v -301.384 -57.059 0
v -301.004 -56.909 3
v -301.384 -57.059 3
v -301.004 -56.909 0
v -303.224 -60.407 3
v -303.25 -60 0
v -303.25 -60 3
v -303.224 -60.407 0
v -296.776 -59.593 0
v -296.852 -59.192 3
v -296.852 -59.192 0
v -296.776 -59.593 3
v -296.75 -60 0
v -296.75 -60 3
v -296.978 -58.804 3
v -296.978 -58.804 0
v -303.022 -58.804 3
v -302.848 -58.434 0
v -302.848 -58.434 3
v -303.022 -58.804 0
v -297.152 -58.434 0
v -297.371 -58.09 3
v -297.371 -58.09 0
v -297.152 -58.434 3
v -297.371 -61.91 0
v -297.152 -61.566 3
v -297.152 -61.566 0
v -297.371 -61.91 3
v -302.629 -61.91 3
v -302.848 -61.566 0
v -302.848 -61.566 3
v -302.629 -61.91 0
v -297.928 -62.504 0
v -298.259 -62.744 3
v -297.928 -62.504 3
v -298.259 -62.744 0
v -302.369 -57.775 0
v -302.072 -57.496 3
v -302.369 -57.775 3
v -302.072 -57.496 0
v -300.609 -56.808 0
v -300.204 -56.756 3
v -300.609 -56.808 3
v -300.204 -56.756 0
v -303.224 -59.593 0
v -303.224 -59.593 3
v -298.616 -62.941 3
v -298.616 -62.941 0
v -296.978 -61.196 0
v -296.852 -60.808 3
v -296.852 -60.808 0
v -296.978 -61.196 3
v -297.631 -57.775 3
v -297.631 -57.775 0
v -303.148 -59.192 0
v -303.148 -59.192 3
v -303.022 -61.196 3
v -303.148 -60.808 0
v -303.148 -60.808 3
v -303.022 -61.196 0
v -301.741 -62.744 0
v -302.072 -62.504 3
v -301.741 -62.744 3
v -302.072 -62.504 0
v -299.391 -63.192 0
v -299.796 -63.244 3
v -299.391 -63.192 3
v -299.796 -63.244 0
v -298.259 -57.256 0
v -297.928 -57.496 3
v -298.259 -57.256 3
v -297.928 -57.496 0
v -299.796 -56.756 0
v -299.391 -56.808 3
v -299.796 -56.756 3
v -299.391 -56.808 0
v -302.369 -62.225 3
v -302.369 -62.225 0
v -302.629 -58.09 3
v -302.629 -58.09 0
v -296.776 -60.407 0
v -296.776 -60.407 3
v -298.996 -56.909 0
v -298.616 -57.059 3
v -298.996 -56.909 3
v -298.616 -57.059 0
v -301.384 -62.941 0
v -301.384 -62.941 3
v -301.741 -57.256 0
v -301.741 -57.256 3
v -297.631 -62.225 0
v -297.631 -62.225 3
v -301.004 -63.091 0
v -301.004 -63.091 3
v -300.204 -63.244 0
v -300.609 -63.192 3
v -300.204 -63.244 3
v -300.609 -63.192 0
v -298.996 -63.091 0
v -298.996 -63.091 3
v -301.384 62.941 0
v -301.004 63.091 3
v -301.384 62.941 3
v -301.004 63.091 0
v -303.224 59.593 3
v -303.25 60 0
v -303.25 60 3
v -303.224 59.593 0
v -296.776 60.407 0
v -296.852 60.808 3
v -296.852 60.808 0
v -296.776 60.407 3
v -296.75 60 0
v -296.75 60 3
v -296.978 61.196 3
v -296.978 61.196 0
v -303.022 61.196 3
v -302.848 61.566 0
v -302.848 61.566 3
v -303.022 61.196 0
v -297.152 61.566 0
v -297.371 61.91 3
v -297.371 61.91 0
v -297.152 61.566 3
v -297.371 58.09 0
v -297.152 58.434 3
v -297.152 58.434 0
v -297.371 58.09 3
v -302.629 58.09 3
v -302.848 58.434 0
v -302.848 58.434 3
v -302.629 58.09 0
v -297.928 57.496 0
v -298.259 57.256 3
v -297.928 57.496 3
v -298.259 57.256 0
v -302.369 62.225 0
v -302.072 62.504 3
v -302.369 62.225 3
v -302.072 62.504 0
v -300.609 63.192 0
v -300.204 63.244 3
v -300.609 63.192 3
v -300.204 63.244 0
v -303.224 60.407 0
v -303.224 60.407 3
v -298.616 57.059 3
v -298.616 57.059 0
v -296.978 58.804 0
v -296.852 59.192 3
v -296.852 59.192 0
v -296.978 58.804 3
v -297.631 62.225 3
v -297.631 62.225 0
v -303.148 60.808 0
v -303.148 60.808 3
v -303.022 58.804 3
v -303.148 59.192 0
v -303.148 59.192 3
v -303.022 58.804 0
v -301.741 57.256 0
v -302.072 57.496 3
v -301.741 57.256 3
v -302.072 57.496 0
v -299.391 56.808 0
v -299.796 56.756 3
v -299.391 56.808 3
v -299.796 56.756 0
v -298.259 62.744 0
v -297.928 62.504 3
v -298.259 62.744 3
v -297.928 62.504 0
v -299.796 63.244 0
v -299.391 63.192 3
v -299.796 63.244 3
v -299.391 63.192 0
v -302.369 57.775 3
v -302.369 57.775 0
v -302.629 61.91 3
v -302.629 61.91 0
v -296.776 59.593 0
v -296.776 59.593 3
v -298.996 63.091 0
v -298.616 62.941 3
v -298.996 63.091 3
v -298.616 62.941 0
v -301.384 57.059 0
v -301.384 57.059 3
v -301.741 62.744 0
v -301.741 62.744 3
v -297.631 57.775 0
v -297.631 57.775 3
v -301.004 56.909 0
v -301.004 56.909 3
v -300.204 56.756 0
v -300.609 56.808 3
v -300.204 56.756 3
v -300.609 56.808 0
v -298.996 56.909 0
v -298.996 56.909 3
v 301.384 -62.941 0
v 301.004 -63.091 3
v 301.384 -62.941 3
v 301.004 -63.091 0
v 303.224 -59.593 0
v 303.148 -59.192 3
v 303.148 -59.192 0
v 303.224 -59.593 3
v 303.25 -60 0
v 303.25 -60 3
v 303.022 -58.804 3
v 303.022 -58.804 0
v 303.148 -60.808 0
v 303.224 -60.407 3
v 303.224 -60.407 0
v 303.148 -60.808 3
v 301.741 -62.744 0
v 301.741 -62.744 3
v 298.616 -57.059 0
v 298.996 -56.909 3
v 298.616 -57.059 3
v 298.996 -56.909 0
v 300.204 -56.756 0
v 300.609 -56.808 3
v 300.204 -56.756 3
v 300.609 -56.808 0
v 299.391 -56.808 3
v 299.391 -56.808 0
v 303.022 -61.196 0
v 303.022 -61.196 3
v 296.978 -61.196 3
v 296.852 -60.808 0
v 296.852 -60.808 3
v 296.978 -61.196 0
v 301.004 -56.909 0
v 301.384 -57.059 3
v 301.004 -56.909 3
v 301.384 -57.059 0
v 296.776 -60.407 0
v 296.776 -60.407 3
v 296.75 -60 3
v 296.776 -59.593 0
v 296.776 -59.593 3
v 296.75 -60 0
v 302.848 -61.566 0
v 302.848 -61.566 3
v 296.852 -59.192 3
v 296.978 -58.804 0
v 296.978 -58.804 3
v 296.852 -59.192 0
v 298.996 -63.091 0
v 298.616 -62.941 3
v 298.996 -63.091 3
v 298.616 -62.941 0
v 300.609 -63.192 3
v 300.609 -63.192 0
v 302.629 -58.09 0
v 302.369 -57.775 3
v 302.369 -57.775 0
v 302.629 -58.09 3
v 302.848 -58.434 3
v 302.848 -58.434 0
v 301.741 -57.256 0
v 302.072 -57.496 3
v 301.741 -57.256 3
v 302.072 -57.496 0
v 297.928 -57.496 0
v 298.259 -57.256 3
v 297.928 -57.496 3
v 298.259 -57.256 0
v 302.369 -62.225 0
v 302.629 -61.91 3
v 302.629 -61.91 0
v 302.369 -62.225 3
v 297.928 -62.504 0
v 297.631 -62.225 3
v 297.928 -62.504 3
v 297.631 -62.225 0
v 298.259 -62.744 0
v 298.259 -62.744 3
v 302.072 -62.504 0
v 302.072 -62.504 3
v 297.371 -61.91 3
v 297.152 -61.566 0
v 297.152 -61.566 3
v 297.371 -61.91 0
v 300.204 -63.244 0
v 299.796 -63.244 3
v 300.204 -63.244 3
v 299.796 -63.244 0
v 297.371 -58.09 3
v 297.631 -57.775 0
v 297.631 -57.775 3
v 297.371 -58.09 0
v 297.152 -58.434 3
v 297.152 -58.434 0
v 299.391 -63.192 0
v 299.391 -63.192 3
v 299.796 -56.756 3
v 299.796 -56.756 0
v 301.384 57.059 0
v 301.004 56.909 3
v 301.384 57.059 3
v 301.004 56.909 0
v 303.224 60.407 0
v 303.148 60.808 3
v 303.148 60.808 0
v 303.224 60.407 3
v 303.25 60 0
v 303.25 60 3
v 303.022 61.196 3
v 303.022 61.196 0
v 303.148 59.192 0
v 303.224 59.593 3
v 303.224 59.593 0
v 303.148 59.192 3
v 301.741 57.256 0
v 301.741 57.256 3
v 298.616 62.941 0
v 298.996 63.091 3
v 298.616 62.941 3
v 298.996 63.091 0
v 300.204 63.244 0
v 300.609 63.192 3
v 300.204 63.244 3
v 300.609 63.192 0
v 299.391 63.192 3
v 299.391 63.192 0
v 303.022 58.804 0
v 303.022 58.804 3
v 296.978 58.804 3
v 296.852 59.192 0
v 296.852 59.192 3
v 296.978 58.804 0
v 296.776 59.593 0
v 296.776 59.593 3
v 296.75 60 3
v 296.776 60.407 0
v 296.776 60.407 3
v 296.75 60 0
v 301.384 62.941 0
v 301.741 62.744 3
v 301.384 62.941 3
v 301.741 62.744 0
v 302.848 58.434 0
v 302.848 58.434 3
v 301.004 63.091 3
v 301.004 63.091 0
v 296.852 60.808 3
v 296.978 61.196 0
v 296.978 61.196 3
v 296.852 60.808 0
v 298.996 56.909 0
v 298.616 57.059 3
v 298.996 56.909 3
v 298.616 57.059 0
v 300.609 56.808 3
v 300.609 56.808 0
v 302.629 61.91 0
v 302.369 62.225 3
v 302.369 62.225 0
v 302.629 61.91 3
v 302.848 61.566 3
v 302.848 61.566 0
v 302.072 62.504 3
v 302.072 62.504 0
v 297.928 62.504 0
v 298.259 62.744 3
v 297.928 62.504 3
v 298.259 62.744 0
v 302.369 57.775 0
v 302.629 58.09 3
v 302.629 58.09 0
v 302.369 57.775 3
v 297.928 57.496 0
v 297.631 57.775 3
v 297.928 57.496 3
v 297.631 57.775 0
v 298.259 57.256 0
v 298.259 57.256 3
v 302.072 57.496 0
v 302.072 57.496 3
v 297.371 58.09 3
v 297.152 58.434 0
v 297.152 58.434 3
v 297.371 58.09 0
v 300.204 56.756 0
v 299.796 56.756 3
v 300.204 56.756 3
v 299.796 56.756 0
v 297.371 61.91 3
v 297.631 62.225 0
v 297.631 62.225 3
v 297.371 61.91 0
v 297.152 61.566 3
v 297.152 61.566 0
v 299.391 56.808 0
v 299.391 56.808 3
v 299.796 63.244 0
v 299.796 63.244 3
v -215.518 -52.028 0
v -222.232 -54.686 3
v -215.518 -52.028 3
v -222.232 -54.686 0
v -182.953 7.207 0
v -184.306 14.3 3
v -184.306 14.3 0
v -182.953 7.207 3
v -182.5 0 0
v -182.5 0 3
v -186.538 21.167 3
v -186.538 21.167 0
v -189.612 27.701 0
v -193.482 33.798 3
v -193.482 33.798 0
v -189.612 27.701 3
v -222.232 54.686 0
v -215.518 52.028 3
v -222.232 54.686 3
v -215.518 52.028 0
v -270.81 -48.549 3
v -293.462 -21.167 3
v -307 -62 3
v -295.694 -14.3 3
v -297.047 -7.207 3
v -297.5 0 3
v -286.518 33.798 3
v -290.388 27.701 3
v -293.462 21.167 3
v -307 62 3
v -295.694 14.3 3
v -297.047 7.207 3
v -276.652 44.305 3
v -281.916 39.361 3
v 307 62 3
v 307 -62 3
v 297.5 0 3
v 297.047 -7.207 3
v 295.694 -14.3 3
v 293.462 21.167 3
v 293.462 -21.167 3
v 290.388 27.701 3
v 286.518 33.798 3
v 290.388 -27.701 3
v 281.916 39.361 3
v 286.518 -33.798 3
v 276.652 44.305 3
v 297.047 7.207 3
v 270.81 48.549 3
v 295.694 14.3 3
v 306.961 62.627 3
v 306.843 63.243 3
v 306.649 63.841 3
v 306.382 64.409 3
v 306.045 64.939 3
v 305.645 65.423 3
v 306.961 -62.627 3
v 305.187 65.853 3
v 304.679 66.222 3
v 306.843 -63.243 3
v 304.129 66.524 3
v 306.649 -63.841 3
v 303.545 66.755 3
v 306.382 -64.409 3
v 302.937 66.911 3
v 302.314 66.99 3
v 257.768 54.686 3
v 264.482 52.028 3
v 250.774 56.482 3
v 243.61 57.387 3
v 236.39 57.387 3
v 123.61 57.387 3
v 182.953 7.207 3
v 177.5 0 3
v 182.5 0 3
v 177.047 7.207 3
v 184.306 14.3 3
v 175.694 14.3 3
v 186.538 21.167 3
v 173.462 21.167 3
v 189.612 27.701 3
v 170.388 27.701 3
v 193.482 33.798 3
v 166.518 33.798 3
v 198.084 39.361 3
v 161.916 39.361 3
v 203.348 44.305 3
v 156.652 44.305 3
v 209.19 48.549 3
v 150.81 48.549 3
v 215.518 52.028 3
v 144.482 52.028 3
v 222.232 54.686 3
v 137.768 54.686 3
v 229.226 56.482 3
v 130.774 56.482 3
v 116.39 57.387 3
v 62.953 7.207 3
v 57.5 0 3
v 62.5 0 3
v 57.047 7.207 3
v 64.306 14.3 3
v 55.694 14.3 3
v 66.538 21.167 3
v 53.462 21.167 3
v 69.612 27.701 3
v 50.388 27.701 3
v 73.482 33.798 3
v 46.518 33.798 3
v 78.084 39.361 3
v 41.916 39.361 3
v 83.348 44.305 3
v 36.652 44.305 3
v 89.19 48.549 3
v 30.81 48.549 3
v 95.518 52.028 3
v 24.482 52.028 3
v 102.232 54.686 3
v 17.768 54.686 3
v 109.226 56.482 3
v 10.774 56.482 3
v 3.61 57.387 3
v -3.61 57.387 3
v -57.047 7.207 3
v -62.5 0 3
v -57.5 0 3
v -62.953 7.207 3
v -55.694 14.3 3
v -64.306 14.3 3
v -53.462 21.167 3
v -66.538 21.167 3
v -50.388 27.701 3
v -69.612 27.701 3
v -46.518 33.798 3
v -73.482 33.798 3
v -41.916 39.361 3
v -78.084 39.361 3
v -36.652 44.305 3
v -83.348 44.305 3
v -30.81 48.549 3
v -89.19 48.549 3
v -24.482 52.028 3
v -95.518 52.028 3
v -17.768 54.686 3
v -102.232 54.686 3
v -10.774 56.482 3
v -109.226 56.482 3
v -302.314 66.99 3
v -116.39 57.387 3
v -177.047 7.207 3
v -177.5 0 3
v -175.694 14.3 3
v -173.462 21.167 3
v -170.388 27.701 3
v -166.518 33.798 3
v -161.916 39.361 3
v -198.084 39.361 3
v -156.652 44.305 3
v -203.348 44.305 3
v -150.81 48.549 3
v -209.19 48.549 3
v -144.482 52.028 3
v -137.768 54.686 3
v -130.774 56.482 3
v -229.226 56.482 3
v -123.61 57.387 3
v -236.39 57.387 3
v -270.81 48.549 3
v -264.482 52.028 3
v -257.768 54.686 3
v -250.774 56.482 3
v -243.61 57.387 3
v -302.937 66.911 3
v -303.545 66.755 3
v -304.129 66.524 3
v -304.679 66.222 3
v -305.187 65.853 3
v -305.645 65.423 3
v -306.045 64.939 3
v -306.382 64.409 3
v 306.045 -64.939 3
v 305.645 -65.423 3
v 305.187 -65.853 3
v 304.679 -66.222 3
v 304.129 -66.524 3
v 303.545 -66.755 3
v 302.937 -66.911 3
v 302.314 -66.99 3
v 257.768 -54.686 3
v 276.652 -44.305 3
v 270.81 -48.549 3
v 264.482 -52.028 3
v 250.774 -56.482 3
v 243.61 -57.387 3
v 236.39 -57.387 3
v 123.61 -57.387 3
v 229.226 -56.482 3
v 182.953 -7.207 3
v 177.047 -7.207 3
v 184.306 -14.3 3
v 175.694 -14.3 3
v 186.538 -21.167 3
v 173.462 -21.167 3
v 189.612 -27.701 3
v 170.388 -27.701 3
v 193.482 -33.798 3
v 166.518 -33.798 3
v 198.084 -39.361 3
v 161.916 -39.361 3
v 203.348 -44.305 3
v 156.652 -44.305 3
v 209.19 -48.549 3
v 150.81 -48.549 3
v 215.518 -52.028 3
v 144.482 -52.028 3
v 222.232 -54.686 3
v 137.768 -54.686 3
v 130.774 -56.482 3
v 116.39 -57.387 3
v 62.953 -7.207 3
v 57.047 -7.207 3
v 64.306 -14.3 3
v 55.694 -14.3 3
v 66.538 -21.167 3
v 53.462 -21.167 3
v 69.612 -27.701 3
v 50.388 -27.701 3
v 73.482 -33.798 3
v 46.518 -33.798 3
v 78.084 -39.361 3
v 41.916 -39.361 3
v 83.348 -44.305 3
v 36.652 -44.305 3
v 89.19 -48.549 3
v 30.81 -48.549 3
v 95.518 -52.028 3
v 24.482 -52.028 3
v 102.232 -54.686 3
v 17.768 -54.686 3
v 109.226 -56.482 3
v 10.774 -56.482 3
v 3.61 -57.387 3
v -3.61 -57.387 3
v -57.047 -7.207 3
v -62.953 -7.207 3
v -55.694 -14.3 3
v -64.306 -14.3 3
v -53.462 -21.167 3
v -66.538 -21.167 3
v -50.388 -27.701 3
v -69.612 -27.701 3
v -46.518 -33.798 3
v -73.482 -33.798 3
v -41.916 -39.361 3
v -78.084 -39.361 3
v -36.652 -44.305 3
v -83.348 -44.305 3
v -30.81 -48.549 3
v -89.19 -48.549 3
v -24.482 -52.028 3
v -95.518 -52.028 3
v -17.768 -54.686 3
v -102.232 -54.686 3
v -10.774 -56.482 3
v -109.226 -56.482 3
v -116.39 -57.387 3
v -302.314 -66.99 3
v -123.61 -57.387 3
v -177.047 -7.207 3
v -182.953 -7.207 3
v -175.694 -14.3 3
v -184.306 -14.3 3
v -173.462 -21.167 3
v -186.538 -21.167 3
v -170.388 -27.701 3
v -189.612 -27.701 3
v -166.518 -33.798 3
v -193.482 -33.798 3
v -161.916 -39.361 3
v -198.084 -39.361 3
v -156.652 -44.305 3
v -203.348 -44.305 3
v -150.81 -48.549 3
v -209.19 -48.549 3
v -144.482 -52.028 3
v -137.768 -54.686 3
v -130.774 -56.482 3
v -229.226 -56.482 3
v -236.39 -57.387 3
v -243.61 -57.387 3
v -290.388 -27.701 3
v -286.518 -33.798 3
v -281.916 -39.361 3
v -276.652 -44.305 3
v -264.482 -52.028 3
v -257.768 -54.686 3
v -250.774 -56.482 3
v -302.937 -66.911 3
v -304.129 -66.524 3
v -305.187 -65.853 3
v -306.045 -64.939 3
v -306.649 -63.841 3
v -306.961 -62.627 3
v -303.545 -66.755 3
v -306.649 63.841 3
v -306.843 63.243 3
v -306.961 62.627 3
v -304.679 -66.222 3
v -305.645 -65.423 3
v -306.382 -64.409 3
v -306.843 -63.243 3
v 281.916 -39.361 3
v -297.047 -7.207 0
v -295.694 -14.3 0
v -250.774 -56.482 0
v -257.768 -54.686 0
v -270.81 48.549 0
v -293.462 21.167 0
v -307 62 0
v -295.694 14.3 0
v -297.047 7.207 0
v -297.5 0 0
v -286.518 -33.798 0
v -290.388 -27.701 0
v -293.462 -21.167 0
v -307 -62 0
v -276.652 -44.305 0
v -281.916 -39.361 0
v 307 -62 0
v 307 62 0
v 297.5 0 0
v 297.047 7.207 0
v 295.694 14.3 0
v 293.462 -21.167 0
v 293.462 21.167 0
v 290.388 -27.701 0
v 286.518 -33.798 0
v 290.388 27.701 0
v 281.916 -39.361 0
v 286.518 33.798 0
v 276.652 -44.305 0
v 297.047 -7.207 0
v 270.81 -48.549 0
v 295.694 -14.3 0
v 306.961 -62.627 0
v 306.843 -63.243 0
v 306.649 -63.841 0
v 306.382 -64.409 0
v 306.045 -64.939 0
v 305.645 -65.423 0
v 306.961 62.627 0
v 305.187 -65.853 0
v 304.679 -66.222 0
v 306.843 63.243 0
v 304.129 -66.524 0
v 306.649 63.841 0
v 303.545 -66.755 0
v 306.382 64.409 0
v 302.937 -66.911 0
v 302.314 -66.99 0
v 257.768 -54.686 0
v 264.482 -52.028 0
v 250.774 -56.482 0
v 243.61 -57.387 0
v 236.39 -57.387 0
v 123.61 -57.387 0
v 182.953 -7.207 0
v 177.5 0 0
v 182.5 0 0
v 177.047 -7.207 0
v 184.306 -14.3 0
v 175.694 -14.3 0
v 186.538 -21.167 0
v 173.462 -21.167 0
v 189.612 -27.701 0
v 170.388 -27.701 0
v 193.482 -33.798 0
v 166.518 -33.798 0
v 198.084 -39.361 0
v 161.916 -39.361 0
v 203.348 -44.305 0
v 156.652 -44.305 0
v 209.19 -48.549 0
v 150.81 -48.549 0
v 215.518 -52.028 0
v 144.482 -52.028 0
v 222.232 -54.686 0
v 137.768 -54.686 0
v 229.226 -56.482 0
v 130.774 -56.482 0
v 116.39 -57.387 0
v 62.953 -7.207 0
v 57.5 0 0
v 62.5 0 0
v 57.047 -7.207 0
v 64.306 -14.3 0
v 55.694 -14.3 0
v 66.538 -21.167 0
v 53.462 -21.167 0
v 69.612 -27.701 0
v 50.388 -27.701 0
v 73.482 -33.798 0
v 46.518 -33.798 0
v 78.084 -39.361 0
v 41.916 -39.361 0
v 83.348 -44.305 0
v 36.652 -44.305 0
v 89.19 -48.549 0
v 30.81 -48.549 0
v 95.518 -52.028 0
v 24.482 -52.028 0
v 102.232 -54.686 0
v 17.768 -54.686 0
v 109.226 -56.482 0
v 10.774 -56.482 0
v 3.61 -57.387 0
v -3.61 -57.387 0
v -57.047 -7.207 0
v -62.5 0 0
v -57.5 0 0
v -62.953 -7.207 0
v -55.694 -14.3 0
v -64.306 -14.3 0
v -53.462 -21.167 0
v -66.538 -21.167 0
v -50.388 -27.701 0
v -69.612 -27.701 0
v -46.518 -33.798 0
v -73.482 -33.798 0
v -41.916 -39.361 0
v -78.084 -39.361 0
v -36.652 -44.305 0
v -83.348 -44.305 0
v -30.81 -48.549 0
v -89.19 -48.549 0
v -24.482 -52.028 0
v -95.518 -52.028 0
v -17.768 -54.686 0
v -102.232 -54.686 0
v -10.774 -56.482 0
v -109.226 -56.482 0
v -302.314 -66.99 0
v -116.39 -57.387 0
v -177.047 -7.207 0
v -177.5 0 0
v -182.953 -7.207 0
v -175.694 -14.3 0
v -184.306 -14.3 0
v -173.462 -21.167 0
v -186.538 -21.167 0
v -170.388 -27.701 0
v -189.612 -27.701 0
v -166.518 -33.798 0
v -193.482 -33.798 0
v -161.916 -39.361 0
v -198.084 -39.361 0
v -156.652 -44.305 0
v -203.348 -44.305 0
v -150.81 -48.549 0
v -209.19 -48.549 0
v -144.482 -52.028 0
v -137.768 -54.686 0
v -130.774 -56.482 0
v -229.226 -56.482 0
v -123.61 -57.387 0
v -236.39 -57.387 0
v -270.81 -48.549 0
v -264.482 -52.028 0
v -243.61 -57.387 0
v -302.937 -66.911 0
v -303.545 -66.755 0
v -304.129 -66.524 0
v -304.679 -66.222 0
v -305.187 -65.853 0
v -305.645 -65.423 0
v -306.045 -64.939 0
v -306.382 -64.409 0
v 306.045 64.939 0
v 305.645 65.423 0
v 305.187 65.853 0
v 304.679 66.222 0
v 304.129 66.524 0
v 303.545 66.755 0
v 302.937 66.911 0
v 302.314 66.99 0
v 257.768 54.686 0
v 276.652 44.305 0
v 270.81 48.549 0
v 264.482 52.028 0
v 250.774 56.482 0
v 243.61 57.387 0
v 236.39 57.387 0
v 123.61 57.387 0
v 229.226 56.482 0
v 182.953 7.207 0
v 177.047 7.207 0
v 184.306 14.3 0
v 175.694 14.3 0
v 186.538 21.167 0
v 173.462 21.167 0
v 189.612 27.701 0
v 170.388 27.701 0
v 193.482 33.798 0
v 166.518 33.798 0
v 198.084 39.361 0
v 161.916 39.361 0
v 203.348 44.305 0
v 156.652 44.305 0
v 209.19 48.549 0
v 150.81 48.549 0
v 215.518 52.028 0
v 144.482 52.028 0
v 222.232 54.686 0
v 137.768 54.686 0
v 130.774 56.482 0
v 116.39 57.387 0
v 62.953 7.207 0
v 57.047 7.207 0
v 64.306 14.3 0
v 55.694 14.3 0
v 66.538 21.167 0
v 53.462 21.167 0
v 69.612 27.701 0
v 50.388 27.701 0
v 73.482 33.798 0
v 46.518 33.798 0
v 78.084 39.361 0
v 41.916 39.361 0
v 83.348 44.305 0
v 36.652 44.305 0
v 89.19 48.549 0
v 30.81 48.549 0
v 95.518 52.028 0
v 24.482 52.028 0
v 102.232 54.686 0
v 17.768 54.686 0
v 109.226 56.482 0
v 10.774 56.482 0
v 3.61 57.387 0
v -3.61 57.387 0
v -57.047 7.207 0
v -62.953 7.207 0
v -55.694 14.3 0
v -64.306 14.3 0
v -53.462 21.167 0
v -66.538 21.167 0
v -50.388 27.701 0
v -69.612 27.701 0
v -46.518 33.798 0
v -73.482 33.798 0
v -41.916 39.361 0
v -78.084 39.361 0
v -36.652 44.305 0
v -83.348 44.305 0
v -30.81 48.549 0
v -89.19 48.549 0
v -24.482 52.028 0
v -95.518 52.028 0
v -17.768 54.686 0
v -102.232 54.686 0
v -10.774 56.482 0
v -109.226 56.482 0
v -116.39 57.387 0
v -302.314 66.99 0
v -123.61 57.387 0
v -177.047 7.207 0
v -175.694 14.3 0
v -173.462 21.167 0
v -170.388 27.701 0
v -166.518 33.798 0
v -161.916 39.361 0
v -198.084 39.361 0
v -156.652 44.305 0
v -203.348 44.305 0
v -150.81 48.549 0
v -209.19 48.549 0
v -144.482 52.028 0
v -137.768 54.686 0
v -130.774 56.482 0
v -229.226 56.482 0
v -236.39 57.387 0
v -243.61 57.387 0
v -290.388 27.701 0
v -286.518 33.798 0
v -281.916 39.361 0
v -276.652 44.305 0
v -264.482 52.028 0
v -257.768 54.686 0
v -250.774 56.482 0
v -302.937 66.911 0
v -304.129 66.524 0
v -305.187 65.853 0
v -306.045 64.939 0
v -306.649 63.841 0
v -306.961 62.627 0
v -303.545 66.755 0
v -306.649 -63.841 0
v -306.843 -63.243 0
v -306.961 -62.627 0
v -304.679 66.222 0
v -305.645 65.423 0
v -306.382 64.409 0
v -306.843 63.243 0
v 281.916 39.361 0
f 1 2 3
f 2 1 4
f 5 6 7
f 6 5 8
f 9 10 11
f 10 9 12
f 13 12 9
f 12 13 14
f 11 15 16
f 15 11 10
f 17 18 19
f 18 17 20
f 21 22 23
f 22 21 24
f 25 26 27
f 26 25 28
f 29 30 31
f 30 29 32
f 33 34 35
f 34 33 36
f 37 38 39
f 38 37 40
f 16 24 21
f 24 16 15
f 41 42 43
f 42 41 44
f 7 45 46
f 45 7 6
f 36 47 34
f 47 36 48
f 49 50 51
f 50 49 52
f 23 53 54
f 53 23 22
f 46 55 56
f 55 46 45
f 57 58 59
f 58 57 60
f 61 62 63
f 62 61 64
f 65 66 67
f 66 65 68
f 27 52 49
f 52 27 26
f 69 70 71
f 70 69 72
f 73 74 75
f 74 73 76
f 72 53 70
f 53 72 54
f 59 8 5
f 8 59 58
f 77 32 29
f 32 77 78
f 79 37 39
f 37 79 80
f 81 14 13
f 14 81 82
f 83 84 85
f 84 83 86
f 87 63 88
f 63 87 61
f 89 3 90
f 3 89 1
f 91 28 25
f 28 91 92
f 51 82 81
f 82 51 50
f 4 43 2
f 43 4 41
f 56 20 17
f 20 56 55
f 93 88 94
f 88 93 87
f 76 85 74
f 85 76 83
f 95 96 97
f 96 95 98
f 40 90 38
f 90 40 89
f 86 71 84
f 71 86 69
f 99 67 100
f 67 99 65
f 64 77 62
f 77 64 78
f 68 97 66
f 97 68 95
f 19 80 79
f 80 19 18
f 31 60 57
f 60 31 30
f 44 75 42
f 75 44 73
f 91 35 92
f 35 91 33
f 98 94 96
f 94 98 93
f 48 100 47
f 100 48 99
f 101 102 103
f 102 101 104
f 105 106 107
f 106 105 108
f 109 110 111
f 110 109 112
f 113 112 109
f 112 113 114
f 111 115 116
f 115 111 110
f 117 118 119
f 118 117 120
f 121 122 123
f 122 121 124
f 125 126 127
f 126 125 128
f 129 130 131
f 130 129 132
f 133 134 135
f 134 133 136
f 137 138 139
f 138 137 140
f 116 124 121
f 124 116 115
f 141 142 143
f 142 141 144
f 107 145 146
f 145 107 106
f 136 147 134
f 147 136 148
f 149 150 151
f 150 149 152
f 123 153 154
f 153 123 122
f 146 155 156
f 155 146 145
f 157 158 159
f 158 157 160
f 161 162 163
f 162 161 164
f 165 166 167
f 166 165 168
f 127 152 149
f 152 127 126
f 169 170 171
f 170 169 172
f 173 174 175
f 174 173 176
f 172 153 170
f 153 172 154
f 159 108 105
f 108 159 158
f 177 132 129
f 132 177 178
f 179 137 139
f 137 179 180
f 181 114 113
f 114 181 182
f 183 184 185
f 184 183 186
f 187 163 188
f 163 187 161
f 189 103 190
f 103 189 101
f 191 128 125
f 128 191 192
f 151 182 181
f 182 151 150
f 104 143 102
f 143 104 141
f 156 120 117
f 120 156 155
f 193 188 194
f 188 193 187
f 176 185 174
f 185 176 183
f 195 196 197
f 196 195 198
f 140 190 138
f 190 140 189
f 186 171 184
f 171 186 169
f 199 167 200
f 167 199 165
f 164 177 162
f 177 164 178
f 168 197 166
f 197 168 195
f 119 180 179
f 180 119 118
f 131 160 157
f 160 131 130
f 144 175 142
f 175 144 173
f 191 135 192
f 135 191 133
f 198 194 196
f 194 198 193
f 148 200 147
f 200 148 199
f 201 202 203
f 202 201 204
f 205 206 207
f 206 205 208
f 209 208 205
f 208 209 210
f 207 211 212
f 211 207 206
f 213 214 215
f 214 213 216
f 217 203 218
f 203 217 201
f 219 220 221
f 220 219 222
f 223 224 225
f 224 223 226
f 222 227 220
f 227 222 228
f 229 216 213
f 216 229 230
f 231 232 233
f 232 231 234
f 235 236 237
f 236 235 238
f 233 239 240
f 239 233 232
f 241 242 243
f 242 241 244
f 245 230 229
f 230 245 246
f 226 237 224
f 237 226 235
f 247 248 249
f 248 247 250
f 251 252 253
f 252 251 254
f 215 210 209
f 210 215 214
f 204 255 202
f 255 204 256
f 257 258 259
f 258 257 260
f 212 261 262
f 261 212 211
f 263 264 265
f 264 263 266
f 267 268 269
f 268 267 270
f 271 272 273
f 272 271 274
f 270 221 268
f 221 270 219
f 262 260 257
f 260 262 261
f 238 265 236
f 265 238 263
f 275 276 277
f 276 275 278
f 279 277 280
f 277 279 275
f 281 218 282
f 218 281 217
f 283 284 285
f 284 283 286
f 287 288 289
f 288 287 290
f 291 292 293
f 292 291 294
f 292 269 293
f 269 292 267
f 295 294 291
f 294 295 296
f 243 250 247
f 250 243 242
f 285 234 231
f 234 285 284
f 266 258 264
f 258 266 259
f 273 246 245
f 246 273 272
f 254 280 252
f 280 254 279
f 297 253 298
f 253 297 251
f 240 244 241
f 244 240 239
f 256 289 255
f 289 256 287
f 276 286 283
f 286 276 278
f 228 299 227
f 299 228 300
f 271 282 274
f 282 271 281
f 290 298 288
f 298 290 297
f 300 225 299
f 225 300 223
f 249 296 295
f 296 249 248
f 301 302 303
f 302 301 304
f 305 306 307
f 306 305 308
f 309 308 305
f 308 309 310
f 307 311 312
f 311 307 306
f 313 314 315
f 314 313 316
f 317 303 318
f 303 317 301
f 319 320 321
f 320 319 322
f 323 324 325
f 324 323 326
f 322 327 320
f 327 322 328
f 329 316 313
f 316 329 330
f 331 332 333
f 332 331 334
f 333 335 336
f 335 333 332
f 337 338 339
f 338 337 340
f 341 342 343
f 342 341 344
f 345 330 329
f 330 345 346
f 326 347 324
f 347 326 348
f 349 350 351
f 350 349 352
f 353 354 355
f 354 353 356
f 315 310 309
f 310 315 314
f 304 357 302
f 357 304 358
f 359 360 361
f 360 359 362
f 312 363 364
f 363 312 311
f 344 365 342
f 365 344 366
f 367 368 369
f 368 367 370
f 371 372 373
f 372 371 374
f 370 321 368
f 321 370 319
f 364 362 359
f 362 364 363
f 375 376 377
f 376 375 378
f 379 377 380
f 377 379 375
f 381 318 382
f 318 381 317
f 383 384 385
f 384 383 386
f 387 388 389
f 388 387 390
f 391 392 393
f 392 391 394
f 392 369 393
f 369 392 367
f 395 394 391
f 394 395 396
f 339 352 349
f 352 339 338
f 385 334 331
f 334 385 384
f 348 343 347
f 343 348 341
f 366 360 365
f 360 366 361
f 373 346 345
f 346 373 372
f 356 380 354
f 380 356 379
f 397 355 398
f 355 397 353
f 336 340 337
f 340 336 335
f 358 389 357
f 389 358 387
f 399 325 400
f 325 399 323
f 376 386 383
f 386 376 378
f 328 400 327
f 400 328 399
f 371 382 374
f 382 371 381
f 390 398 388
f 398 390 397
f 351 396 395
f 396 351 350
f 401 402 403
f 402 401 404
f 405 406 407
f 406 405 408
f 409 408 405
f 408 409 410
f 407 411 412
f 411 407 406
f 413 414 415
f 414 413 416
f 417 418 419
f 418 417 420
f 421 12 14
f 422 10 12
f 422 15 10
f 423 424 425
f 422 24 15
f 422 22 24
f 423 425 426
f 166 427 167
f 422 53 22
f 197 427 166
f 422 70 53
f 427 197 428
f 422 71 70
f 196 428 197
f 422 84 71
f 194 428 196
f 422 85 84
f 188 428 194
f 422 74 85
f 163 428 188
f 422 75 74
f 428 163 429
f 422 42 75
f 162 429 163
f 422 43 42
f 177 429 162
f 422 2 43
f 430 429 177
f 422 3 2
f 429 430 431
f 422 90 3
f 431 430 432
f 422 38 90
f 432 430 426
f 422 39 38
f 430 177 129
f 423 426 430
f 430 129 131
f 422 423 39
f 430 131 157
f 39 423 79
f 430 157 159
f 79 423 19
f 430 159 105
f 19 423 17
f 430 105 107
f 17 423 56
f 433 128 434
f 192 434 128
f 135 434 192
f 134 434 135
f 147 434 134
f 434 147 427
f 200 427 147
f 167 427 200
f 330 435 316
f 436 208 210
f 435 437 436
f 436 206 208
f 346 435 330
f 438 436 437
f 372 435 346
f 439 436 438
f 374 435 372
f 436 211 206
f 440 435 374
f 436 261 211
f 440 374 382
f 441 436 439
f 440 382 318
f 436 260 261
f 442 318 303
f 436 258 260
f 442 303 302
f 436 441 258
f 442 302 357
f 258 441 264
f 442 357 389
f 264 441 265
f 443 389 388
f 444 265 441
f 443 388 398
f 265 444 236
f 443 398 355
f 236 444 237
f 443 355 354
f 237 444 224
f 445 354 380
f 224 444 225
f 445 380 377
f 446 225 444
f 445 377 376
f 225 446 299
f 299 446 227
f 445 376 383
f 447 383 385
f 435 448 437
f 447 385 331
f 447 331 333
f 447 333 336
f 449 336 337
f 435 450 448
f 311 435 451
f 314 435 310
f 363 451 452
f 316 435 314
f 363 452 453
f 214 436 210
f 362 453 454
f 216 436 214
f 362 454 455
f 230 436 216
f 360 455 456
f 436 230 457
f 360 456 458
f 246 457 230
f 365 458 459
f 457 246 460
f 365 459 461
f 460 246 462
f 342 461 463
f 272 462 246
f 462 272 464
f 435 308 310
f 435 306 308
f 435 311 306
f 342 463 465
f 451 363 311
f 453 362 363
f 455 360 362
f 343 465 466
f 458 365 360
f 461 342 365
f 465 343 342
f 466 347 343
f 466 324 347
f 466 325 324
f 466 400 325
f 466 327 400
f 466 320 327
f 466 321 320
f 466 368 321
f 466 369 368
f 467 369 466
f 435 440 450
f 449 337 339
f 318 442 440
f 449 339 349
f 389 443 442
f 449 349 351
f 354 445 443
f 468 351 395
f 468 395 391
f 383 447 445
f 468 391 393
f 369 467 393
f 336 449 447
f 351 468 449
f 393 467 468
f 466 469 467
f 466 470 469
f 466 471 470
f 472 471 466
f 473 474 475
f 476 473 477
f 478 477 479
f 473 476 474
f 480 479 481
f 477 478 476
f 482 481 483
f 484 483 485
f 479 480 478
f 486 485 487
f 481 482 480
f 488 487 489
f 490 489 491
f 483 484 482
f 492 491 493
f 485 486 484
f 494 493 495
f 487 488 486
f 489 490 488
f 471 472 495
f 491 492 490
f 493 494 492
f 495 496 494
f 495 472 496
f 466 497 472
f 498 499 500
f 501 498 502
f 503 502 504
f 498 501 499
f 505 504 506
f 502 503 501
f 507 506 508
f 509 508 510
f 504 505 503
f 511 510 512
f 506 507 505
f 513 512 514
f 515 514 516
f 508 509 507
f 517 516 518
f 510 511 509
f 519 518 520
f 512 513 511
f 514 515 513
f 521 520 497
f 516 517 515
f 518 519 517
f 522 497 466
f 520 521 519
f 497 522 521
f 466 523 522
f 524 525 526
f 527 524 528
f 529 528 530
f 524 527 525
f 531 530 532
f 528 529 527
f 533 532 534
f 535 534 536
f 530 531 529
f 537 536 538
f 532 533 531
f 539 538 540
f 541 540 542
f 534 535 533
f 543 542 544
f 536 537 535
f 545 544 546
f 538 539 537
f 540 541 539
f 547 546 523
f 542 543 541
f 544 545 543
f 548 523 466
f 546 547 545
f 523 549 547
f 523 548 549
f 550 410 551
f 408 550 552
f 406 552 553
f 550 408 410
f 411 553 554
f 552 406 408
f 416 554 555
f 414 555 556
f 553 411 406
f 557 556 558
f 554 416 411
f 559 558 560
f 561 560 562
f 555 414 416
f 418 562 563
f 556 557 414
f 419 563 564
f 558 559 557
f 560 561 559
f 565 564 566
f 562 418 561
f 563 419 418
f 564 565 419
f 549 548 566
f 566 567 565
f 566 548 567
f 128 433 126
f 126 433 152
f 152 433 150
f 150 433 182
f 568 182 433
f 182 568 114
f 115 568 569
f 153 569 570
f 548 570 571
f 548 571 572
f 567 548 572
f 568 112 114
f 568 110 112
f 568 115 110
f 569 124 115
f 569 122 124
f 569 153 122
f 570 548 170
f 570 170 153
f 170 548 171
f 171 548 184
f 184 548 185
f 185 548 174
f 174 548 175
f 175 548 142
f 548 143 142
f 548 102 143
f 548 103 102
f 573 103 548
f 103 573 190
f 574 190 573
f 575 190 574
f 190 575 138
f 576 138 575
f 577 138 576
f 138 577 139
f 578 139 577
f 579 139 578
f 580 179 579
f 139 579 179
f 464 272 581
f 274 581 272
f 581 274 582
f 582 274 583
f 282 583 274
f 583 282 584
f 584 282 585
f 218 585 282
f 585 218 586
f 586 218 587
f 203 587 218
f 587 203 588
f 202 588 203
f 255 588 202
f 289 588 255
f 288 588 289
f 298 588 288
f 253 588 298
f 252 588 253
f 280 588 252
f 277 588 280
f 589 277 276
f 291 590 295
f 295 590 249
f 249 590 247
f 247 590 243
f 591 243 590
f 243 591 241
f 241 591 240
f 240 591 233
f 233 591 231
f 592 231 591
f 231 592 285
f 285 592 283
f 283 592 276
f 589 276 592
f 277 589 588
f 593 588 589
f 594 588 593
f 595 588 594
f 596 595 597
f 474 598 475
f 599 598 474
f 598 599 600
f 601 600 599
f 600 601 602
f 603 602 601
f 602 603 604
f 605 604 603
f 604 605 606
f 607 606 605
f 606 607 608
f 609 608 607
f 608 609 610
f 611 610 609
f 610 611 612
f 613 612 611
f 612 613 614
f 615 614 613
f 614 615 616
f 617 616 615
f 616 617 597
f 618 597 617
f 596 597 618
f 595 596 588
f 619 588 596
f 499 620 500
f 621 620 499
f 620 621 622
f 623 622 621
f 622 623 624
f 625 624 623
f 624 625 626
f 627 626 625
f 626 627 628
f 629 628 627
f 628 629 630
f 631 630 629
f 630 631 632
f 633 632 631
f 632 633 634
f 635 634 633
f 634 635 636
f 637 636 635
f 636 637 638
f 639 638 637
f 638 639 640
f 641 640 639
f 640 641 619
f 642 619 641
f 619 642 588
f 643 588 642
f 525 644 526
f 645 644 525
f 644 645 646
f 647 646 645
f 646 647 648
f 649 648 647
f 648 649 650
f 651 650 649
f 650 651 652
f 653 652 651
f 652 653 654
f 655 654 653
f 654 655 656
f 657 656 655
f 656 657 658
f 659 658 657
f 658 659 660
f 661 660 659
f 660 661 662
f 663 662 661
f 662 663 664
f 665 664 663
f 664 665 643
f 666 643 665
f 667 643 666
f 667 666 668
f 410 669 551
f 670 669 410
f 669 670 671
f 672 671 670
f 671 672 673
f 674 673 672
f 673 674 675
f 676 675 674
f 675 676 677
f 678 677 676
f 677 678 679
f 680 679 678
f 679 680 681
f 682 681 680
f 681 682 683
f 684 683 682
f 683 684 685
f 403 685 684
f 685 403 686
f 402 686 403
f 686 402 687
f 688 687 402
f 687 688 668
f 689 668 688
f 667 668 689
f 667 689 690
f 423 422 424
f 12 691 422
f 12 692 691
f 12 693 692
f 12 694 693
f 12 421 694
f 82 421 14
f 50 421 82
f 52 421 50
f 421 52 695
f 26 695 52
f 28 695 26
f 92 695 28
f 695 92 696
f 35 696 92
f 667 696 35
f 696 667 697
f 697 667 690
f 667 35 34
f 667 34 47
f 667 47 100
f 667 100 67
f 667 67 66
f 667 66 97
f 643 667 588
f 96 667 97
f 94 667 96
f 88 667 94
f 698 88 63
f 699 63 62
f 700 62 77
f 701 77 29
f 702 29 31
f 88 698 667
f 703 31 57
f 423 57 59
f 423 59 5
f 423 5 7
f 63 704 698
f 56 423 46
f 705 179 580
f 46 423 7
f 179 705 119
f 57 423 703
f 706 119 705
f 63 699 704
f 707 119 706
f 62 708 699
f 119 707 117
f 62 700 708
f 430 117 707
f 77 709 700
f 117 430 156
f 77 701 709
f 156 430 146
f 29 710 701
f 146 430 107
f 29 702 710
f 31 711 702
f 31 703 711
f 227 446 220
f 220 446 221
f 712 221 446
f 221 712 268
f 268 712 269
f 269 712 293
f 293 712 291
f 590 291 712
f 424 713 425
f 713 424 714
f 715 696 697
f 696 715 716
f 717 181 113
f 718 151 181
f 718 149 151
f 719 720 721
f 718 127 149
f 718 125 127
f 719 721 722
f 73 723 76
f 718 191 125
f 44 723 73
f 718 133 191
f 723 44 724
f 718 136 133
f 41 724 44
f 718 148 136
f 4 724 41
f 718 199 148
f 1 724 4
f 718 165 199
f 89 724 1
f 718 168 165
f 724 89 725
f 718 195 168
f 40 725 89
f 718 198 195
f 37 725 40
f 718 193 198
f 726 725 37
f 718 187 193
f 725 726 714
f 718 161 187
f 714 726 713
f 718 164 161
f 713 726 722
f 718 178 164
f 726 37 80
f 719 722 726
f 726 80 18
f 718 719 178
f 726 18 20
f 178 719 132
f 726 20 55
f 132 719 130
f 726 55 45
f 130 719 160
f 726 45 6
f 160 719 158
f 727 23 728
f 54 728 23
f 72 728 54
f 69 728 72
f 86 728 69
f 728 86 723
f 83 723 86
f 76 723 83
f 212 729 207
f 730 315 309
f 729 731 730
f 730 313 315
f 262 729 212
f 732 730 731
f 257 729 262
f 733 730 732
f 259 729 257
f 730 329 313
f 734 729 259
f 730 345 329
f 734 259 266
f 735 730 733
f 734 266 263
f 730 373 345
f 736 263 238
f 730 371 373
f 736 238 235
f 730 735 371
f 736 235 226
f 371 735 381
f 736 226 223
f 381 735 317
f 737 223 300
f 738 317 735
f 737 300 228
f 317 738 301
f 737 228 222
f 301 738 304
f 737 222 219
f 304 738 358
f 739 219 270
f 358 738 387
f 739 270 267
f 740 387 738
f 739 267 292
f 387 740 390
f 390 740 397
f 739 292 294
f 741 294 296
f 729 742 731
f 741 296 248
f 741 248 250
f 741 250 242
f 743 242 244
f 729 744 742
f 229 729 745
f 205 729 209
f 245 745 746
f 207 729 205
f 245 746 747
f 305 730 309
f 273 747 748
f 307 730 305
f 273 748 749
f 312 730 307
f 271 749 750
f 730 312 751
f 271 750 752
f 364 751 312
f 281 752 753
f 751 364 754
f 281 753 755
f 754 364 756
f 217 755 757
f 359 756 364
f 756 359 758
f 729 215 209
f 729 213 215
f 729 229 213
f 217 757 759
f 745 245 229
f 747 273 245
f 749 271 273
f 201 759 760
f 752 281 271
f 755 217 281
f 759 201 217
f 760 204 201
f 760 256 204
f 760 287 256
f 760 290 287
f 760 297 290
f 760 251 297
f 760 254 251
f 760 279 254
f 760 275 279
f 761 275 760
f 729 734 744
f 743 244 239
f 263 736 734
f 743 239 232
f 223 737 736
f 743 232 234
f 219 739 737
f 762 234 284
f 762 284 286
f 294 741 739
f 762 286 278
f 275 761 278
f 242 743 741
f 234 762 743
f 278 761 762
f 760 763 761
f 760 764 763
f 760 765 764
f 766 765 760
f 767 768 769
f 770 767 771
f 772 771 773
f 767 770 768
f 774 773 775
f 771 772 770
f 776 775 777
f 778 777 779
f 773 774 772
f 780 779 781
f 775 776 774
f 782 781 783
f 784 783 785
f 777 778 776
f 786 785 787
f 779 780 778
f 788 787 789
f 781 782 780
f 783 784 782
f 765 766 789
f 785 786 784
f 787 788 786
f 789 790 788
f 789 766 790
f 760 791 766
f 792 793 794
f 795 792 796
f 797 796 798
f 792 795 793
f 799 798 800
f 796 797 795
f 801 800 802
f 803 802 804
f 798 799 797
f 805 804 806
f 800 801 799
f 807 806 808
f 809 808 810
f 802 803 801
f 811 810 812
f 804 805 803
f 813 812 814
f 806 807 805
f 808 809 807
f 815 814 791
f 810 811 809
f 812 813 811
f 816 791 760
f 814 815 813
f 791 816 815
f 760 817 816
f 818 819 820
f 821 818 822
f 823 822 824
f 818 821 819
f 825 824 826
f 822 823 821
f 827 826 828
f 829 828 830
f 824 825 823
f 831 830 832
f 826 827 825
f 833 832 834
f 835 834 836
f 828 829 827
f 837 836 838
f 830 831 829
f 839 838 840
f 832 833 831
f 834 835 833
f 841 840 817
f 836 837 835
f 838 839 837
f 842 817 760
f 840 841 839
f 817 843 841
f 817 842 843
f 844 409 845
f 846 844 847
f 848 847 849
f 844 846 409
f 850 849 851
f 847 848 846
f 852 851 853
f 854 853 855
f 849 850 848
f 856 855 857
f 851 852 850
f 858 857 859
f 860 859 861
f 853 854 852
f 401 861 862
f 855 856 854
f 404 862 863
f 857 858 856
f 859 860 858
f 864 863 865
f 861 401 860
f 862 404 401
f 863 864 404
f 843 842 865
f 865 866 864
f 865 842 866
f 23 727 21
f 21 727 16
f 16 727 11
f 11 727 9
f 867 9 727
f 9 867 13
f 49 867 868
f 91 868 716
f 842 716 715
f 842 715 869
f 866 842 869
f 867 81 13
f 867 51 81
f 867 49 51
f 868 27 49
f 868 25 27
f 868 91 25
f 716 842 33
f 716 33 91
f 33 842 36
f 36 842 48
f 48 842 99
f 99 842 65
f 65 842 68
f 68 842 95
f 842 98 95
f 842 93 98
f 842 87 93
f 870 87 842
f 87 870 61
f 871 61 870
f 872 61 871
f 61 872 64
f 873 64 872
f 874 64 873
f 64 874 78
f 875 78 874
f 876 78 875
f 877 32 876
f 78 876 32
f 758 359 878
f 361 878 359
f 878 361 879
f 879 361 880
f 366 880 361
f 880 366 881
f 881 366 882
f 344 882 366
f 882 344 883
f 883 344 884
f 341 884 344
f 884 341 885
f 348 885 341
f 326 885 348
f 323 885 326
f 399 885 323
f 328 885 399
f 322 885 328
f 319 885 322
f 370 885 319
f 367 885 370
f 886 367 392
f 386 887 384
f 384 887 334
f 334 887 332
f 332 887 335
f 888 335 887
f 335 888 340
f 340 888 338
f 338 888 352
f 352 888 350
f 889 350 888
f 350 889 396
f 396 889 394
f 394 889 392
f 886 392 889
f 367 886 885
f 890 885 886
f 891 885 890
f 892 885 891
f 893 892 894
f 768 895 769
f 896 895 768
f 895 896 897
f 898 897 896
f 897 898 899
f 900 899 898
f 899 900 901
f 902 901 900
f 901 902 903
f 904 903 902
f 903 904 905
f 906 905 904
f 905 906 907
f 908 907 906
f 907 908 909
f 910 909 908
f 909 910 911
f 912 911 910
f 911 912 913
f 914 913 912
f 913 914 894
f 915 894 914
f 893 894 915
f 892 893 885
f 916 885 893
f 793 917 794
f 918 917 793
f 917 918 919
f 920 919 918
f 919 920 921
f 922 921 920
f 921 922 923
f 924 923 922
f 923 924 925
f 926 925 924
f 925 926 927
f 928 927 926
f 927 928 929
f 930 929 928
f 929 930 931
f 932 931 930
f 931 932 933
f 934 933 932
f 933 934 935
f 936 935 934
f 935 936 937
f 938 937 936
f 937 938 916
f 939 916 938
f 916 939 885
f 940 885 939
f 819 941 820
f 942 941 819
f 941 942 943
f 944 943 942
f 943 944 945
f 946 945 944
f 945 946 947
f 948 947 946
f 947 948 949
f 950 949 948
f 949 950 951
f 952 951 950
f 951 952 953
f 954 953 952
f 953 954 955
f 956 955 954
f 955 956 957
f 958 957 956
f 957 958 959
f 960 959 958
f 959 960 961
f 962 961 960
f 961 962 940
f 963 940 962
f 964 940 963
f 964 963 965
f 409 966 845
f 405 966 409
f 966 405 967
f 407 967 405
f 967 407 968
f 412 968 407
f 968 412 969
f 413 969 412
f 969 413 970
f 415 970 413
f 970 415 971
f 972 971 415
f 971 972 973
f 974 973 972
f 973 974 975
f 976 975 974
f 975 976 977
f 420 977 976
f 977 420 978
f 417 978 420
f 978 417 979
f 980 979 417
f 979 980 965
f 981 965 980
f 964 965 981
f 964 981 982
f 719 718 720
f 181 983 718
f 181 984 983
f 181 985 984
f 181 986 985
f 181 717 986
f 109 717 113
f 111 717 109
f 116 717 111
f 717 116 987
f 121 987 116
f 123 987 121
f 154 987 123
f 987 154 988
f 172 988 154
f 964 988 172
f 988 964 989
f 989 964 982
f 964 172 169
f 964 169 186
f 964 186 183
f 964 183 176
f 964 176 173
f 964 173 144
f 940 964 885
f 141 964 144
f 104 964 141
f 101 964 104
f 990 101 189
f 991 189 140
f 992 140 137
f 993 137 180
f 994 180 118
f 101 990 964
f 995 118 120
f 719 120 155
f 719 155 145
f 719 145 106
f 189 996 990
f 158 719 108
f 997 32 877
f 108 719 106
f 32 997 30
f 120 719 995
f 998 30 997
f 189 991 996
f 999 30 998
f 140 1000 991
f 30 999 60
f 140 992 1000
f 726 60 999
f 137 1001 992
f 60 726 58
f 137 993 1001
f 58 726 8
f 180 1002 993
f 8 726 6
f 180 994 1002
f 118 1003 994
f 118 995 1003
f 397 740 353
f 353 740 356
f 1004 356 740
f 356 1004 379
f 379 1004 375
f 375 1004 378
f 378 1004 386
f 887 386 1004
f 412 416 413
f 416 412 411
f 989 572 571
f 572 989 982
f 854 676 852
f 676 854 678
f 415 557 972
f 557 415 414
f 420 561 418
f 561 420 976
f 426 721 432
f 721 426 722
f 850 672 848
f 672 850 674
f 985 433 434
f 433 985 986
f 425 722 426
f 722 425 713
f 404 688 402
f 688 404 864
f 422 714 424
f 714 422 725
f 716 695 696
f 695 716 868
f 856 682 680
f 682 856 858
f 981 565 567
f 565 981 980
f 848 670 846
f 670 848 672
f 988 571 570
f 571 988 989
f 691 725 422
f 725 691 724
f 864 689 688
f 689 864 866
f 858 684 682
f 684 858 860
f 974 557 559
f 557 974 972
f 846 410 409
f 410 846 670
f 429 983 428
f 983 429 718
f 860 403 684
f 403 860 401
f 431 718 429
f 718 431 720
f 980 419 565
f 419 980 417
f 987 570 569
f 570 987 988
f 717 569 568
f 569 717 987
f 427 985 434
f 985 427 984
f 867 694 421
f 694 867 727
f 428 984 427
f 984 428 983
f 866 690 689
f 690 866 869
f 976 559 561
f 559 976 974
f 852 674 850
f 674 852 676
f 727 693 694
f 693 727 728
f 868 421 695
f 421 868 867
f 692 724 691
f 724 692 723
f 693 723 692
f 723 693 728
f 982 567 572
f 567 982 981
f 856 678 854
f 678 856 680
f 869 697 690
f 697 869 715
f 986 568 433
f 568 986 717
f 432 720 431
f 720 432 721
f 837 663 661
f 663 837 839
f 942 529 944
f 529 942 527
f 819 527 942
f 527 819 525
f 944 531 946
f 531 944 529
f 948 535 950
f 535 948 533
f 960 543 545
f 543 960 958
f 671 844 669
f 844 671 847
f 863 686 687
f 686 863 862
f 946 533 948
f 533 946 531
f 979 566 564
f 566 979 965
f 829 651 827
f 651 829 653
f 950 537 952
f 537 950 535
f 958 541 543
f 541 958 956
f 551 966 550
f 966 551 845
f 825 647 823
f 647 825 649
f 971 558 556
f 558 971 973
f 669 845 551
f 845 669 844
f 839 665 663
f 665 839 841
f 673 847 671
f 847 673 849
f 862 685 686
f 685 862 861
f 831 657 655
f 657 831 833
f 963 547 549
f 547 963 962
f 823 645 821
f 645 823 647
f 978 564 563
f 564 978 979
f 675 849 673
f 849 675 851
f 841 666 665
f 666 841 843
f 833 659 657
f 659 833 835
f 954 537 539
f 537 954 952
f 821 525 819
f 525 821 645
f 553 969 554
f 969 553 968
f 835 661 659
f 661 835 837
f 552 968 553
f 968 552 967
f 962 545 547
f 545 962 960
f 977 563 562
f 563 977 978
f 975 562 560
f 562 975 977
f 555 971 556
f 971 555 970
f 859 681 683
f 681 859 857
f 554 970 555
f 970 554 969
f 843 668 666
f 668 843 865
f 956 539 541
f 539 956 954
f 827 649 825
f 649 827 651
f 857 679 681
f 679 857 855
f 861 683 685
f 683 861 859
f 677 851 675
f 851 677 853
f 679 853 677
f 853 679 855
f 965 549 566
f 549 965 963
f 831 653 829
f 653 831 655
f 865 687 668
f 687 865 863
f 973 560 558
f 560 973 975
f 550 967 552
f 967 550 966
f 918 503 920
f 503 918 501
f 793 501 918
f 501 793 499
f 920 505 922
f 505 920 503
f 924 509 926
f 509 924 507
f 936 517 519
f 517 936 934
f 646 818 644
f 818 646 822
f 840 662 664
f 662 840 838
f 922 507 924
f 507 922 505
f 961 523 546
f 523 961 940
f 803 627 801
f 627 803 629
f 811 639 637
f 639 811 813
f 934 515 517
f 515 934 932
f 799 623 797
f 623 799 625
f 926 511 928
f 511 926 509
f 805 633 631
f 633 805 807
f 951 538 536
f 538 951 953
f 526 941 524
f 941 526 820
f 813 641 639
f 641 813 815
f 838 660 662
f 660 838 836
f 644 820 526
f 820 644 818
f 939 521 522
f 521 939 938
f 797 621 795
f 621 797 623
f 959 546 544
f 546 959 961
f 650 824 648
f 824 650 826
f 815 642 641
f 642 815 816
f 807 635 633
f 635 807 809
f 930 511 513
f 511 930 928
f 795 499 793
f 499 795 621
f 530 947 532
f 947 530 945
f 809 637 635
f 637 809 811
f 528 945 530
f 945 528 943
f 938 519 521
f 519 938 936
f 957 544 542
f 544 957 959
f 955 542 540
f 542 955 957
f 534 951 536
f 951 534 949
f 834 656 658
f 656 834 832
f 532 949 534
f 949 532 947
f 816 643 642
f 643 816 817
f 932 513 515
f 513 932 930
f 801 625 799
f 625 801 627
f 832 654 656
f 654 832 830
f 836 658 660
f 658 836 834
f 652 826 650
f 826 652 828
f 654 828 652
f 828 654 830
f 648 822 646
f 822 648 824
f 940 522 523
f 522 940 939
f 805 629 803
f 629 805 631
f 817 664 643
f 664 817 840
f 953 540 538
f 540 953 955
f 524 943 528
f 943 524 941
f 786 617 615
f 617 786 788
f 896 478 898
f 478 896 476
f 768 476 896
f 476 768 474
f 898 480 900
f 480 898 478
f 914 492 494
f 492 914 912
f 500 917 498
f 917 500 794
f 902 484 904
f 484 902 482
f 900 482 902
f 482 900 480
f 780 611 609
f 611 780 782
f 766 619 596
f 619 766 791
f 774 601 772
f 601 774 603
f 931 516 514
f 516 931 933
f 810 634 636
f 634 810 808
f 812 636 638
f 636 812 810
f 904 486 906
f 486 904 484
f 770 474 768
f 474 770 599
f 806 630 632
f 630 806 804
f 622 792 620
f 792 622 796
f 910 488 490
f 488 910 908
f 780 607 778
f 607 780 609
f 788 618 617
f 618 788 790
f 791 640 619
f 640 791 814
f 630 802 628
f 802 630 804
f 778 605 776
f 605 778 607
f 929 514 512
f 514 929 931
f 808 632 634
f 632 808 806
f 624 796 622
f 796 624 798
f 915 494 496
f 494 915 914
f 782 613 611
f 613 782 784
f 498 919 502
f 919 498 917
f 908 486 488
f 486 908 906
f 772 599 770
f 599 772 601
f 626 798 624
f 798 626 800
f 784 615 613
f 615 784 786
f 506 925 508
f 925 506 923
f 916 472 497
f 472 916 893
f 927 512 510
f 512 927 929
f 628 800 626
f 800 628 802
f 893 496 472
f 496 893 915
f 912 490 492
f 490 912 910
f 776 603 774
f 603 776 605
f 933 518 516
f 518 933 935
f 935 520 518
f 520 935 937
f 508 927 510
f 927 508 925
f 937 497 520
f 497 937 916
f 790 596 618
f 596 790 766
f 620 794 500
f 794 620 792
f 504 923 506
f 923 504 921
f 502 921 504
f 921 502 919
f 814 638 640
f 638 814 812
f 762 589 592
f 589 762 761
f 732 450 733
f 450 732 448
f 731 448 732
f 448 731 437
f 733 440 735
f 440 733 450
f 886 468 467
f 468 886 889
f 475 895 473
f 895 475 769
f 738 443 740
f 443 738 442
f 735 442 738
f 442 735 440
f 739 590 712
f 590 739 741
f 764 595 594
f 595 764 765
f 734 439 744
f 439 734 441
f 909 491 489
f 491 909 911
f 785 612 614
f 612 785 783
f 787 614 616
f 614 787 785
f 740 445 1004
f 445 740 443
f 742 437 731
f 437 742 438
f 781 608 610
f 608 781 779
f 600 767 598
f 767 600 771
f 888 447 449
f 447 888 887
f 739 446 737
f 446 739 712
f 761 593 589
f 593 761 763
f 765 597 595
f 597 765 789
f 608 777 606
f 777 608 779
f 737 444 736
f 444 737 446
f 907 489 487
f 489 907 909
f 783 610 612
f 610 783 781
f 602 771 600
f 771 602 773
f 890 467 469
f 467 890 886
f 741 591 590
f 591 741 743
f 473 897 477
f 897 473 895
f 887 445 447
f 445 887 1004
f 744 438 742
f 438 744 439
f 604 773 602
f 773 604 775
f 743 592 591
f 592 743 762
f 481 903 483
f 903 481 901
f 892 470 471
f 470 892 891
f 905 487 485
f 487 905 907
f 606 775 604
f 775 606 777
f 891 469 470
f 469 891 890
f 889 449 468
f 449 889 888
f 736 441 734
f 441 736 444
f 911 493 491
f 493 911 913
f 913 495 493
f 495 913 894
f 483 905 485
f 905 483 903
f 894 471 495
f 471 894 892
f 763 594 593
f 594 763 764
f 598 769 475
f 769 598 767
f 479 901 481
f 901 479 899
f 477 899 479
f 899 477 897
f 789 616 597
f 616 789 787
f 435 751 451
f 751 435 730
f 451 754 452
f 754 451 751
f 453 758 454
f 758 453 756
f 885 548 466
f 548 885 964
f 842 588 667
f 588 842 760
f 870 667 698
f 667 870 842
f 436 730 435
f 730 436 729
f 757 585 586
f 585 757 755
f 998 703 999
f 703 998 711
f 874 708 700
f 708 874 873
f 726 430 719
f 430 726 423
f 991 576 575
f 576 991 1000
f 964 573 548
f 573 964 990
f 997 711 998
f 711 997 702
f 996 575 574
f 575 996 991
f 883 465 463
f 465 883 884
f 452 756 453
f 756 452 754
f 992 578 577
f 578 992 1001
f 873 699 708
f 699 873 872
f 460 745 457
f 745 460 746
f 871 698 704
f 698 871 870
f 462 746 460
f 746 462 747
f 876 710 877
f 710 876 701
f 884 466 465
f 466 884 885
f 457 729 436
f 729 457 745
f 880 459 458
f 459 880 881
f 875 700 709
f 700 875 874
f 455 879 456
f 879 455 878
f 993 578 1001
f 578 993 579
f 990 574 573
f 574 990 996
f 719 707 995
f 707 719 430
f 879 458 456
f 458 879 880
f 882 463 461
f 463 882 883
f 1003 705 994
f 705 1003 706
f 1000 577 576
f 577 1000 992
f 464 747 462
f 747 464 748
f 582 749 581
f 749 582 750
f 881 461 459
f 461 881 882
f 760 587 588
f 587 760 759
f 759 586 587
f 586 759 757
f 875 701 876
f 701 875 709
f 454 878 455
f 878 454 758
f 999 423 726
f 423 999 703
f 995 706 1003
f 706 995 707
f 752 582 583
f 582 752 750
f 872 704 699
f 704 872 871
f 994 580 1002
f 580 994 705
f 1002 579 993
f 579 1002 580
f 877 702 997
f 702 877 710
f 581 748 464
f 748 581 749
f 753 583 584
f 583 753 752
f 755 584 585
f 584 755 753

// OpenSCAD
$fn = 50;


difference() {
	union() {
		hull() {
			translate(v = [-302.0000000000, 62.0000000000, 0]) {
				cylinder(h = 3, r = 5);
			}
			translate(v = [302.0000000000, 62.0000000000, 0]) {
				cylinder(h = 3, r = 5);
			}
			translate(v = [-302.0000000000, -62.0000000000, 0]) {
				cylinder(h = 3, r = 5);
			}
			translate(v = [302.0000000000, -62.0000000000, 0]) {
				cylinder(h = 3, r = 5);
			}
		}
	}
	union() {
		#translate(v = [-300.0000000000, -60.0000000000, -100.0000000000]) {
			cylinder(h = 200, r = 3.2500000000);
		}
		#translate(v = [-300.0000000000, 60.0000000000, -100.0000000000]) {
			cylinder(h = 200, r = 3.2500000000);
		}
		#translate(v = [300.0000000000, -60.0000000000, -100.0000000000]) {
			cylinder(h = 200, r = 3.2500000000);
		}
		#translate(v = [300.0000000000, 60.0000000000, -100.0000000000]) {
			cylinder(h = 200, r = 3.2500000000);
		}
		#translate(v = [-240.0000000000, 0, 0]) {
			cylinder(h = 3, r = 57.5000000000);
		}
		#translate(v = [-120.0000000000, 0, 0]) {
			cylinder(h = 3, r = 57.5000000000);
		}
		#cylinder(h = 3, r = 57.5000000000);
		#translate(v = [120.0000000000, 0, 0]) {
			cylinder(h = 3, r = 57.5000000000);
		}
		#translate(v = [240.0000000000, 0, 0]) {
			cylinder(h = 3, r = 57.5000000000);
		}
	}
}
